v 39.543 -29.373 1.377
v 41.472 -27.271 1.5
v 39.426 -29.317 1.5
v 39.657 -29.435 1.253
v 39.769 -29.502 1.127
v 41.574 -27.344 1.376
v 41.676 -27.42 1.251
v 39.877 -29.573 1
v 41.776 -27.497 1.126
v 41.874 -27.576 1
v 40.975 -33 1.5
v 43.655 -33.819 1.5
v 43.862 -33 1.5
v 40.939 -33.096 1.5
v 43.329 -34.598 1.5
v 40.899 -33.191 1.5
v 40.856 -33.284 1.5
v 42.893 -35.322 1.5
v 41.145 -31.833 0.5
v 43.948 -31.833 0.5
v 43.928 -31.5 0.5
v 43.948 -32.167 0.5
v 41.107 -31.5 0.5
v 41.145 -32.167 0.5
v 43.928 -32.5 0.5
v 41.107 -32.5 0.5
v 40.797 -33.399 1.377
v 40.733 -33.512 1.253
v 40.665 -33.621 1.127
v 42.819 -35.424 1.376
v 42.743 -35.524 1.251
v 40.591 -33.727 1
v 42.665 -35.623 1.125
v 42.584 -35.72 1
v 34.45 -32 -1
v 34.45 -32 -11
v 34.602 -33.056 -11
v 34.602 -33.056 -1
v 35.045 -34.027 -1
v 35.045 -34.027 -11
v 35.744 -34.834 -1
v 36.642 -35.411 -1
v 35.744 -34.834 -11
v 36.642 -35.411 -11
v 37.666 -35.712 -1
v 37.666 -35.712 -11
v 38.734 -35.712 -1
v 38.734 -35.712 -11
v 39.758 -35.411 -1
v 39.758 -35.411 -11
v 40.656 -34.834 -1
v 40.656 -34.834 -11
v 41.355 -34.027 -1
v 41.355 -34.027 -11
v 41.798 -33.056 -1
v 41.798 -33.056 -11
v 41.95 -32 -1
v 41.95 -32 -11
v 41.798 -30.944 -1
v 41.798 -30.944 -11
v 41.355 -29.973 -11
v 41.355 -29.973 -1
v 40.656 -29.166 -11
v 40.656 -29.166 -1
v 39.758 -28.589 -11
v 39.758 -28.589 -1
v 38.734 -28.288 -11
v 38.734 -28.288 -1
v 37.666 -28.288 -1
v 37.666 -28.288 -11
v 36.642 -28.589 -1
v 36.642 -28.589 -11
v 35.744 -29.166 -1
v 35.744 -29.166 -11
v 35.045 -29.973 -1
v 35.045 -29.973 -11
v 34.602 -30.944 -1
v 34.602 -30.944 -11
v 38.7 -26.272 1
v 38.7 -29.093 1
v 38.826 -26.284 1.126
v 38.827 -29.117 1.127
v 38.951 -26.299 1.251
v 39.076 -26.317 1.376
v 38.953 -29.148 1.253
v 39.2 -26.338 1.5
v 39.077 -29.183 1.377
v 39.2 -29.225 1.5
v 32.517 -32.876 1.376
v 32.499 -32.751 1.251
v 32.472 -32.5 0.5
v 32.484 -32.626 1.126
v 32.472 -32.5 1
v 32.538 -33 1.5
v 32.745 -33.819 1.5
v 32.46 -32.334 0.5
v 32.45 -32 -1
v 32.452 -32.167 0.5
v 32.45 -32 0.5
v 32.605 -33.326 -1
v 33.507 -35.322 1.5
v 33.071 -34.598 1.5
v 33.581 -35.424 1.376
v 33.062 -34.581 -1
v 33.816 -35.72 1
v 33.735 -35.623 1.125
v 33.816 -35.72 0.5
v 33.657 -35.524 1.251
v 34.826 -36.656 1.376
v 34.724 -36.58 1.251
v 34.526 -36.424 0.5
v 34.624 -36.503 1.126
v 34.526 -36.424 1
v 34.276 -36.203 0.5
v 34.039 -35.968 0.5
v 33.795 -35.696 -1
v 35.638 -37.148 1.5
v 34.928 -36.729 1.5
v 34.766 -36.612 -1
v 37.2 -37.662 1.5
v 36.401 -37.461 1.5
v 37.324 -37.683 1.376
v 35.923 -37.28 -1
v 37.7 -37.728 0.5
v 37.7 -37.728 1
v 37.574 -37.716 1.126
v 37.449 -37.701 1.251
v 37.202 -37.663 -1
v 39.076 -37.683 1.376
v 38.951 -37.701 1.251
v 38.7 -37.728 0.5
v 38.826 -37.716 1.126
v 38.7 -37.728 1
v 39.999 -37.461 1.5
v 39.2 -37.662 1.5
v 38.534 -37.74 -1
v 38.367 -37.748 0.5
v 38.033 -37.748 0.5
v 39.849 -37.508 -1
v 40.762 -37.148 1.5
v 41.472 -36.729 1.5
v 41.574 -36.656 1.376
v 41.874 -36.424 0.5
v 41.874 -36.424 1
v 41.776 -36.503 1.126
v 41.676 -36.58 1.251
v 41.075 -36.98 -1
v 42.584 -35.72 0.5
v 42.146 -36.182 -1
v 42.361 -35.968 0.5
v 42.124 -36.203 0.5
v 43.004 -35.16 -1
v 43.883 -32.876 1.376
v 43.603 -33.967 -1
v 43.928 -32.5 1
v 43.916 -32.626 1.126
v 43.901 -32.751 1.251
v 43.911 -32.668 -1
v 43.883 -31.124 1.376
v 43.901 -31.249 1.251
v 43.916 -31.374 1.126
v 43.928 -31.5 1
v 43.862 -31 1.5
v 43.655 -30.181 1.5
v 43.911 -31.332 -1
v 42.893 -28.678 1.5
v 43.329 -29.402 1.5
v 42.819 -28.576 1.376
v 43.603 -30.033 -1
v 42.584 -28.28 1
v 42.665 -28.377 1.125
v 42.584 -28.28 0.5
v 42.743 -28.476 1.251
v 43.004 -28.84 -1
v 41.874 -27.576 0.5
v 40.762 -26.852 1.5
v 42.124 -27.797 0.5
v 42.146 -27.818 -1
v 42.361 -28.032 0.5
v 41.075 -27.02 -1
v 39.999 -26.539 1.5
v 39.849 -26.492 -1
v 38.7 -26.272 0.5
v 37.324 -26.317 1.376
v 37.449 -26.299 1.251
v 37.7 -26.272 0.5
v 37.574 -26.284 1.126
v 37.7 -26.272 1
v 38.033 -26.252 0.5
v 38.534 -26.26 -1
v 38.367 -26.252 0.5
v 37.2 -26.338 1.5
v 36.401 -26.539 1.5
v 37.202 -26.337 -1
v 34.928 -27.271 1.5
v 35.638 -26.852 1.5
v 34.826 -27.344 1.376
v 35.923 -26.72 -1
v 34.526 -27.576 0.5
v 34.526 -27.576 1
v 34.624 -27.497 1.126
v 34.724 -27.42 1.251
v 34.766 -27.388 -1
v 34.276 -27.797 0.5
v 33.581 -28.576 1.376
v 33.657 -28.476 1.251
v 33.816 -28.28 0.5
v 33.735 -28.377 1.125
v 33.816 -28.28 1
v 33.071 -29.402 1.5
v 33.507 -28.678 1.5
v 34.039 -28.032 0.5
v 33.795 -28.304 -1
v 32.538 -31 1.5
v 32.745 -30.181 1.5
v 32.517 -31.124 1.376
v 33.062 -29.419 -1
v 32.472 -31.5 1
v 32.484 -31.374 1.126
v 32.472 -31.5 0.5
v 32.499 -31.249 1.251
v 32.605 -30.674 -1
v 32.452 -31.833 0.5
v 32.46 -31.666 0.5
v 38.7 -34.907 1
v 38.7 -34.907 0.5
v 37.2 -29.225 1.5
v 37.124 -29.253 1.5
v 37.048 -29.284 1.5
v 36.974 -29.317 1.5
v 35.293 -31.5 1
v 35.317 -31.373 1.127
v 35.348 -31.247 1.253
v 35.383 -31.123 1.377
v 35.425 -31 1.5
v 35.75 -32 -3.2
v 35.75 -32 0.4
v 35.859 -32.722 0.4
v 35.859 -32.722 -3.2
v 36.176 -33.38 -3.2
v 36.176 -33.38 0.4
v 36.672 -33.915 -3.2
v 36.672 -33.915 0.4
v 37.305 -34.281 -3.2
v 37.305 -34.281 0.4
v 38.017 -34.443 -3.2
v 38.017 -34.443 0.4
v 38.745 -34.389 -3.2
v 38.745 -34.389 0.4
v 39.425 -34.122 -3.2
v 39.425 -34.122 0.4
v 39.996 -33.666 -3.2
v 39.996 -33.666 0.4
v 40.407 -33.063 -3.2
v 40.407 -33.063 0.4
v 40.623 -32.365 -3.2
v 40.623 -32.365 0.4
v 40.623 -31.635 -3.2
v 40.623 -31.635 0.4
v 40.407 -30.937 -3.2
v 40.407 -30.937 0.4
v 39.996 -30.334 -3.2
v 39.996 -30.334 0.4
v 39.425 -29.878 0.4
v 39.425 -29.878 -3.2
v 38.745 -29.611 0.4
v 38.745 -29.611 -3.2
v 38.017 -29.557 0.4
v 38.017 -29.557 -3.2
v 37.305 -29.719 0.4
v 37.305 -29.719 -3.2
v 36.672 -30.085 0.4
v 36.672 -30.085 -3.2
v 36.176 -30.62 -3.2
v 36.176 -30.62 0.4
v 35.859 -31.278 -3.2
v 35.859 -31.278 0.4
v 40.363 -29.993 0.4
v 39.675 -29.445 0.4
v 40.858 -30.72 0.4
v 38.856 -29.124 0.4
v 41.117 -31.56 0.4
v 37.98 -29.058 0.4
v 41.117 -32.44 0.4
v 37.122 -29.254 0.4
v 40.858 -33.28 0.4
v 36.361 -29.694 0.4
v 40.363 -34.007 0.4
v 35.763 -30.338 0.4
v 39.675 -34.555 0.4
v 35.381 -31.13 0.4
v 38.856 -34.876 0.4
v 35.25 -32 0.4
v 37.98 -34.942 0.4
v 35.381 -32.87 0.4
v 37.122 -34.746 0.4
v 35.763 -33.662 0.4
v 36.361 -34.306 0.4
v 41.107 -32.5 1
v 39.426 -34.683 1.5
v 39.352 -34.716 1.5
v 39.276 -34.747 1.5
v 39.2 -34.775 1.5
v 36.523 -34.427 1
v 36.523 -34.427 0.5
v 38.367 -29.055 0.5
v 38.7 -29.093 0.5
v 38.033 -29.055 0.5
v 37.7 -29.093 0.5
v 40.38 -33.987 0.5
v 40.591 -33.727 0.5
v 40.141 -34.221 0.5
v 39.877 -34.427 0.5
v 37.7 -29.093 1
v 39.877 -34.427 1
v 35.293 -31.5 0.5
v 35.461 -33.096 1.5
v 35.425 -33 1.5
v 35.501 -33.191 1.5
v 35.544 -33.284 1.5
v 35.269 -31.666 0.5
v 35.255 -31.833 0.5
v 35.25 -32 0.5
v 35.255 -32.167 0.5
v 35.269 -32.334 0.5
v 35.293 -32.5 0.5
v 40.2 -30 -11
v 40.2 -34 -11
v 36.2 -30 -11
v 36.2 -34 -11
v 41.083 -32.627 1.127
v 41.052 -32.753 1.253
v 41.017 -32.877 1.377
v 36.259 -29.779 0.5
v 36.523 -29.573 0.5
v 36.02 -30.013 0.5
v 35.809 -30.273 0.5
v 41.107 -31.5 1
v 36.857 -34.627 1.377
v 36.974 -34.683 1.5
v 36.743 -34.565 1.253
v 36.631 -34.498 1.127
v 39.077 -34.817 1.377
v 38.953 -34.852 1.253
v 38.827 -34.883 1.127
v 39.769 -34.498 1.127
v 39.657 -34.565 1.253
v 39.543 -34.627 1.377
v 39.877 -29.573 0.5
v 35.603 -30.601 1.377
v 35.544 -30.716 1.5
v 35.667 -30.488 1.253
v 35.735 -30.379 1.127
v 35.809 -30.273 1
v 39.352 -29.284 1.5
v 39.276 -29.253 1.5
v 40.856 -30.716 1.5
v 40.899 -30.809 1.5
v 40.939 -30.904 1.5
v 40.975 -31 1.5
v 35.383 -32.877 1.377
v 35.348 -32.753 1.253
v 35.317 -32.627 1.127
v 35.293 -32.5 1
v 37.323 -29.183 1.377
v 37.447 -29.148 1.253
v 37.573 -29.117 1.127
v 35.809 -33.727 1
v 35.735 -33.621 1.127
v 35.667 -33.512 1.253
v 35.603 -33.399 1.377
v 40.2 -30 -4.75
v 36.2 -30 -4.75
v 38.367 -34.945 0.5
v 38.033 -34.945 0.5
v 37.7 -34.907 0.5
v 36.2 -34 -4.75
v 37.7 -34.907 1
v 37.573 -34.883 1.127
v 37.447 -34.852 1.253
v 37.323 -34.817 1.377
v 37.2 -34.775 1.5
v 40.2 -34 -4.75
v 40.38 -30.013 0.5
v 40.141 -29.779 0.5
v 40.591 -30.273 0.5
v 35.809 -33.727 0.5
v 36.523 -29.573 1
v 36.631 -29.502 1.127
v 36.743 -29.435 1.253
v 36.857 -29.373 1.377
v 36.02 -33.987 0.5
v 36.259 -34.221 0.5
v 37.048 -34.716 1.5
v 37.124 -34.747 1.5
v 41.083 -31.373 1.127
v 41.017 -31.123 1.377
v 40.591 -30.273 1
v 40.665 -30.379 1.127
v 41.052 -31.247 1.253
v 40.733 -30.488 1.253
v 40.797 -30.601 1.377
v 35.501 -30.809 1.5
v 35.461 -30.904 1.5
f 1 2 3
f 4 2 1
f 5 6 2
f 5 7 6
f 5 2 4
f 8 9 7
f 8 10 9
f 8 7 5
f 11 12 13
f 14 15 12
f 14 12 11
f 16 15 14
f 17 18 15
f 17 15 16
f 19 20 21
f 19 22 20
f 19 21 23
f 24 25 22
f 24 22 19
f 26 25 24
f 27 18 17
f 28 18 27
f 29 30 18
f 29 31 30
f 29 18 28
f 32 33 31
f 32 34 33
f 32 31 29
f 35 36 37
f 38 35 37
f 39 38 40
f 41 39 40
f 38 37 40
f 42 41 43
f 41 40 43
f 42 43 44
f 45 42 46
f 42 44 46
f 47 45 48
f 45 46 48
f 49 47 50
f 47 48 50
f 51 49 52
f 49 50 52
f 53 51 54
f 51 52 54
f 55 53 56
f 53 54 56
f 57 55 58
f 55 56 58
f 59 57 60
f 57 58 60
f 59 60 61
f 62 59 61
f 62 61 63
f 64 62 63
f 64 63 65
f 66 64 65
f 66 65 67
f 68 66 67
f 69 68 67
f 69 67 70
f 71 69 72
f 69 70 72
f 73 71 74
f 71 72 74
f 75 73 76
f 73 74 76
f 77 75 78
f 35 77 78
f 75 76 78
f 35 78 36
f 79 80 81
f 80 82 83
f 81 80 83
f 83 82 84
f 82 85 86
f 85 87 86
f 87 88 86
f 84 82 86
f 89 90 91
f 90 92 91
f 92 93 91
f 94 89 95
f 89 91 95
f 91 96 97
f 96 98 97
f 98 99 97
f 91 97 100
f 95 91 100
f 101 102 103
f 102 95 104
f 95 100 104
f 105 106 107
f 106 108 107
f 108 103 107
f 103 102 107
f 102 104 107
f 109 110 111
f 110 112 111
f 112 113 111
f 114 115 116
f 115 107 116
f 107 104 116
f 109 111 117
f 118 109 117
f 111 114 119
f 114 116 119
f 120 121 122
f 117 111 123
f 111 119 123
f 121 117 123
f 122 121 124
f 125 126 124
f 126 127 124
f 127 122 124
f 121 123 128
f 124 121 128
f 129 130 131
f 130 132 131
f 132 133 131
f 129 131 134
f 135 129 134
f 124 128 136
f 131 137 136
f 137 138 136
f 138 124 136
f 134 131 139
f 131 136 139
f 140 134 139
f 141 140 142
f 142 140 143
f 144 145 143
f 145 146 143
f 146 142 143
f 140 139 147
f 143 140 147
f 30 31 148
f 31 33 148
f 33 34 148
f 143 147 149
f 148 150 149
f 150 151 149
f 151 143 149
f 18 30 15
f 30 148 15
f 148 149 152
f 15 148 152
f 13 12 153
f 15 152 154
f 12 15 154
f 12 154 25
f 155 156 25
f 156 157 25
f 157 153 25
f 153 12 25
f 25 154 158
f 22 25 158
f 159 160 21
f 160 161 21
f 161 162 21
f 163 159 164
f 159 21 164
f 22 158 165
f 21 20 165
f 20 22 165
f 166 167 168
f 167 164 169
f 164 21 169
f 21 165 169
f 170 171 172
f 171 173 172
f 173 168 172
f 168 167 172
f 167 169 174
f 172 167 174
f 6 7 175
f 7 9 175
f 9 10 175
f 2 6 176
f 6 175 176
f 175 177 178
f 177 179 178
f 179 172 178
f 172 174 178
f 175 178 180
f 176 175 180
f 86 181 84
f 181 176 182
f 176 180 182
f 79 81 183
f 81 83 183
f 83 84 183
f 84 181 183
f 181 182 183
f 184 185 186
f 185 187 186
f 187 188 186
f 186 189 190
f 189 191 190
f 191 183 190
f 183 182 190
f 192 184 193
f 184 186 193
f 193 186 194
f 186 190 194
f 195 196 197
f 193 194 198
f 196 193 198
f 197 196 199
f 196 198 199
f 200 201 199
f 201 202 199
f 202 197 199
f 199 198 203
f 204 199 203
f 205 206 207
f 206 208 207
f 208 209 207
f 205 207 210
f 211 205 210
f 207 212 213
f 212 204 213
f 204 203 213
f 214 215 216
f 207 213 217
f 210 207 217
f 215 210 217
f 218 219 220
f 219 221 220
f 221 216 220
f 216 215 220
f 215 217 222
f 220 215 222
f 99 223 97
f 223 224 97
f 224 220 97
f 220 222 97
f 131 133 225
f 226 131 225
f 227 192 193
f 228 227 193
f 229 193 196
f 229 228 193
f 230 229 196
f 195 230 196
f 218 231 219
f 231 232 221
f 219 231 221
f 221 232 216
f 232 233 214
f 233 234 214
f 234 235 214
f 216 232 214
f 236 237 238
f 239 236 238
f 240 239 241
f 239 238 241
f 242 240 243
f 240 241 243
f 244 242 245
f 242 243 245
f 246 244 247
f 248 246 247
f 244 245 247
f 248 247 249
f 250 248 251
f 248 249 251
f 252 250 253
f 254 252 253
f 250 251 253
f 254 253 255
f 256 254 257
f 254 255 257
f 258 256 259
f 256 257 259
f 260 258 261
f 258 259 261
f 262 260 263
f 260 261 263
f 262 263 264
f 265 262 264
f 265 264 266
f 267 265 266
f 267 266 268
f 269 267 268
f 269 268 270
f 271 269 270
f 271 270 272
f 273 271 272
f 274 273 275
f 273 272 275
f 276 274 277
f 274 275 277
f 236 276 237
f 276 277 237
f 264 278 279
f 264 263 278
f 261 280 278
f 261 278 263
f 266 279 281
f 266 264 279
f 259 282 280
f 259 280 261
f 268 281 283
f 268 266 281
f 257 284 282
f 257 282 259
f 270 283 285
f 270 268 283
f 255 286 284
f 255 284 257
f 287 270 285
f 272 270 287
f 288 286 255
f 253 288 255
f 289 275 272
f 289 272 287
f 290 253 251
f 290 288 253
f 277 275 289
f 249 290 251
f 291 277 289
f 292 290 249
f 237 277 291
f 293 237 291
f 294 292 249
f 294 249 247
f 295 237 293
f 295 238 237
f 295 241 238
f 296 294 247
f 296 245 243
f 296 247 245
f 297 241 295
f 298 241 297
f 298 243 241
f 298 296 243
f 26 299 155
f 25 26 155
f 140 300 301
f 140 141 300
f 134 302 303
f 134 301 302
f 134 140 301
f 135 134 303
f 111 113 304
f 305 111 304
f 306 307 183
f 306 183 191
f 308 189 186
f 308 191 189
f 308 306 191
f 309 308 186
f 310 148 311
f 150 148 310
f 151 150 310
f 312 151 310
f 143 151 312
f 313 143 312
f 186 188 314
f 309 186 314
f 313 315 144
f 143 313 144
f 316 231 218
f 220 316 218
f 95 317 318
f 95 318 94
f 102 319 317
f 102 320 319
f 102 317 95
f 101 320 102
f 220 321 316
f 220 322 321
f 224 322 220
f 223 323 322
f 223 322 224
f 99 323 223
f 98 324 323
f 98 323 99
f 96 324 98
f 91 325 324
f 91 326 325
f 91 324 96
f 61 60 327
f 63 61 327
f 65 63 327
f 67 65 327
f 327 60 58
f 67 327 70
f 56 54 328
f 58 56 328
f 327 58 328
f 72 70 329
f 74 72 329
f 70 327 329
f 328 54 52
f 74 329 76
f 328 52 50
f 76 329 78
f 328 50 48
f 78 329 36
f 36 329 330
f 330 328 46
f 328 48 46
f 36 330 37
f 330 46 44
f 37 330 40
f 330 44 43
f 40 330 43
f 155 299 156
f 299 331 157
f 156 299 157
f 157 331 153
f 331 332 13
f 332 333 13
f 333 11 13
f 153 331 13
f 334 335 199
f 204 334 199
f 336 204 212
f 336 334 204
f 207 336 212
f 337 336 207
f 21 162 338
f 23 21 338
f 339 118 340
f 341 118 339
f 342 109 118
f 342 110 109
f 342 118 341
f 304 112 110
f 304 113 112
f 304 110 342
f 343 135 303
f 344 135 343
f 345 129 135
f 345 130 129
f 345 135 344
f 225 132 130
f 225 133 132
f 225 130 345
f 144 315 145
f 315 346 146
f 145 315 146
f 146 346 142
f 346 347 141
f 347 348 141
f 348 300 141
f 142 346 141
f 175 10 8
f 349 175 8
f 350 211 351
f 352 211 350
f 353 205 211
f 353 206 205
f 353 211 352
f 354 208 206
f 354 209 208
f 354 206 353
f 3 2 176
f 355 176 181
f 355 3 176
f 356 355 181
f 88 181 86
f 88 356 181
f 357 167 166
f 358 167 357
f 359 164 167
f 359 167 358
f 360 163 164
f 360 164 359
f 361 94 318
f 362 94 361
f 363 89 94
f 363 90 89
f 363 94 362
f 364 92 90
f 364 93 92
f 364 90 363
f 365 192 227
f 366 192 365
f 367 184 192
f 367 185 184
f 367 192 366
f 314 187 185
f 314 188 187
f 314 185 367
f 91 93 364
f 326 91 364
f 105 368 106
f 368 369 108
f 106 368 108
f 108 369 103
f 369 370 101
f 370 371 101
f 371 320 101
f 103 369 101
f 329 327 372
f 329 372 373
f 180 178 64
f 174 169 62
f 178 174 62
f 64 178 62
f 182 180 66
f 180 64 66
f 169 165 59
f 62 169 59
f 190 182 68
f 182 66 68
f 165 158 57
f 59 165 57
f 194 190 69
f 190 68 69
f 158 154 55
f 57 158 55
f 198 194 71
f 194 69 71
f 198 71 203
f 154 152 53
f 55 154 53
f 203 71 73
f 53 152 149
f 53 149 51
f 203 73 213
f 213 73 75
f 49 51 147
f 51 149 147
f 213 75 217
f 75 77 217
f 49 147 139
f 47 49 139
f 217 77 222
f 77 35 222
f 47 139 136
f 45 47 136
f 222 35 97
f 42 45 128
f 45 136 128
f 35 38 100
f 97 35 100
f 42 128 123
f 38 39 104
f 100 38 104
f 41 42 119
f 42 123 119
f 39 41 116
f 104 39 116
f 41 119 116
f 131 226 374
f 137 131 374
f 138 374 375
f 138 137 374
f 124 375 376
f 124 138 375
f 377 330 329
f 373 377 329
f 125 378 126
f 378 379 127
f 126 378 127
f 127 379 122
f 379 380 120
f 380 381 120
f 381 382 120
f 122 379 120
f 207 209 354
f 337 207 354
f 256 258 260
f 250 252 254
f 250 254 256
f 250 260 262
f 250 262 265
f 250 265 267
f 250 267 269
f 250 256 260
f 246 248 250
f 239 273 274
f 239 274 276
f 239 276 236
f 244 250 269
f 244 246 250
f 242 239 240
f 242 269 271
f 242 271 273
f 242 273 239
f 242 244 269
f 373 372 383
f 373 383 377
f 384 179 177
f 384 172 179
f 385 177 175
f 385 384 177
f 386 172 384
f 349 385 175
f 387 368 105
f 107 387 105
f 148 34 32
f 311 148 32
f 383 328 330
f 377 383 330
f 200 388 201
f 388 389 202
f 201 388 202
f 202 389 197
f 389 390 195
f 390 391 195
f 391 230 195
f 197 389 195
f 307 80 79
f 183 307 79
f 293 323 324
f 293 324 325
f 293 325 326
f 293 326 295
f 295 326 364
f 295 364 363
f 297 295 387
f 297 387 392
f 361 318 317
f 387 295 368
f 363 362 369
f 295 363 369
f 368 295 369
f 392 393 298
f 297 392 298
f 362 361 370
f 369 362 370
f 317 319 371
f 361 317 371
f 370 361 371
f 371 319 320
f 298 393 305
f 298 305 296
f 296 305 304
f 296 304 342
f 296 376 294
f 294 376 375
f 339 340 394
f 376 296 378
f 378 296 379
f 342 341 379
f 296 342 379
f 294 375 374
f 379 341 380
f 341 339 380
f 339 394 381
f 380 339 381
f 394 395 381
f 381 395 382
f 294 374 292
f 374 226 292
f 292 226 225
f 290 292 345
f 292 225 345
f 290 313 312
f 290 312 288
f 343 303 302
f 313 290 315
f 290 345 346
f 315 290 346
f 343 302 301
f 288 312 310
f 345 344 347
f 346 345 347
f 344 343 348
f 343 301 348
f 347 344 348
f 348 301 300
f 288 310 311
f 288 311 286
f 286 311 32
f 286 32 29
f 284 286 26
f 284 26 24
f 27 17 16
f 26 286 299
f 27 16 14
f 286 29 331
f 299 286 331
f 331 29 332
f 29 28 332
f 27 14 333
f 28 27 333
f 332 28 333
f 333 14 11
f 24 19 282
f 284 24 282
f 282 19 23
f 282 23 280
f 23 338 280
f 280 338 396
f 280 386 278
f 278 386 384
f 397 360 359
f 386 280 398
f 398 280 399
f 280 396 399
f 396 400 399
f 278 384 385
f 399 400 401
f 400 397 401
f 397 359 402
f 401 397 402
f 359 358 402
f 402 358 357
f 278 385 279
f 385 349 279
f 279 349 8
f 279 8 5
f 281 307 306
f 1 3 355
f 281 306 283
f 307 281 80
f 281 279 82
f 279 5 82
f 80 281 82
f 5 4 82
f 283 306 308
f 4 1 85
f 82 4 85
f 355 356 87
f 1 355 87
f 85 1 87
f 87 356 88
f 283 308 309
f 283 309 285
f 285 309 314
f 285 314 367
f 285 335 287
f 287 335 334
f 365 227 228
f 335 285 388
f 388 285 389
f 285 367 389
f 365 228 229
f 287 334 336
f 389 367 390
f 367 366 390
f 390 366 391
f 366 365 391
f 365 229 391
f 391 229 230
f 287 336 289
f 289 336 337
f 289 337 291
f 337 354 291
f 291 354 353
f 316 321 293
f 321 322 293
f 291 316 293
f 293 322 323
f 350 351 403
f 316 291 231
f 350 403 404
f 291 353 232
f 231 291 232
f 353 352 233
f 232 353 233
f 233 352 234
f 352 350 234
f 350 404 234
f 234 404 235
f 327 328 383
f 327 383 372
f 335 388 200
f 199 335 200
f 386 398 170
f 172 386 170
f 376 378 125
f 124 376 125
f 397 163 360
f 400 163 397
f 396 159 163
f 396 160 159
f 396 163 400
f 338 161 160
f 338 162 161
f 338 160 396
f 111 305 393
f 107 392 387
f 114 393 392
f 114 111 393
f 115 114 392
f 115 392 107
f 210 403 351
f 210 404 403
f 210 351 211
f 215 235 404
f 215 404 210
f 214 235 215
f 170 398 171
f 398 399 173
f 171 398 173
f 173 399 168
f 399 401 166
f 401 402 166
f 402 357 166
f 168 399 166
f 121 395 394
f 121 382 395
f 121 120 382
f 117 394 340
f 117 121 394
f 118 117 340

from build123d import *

# Parameters (mm, degrees)
SKETCH275_R             = 3.75
PAD158_DEPTH            = 10
SKETCH276_R             = 5.75
PAD159_DEPTH            = 2.5
SKETCH277_R             = 2.95
POCKET130_DEPTH         = 1.1
SKETCH278_R             = 2.45
POCKET131_DEPTH         = 3.6
POCKET132_DEPTH         = 1
CHAMFER_SIZE            = 0.5
SKETCH280_W             = 4
SKETCH280_H             = 4
POCKET133_DEPTH         = 6.25
BODY023_PLACEMENT_ANGLE = 180


with BuildPart() as part:
    # Sketch275 → Pad158 (new body)
    with BuildSketch(Plane.XY):
        Circle(SKETCH275_R)
    extrude(amount=PAD158_DEPTH)

    # Sketch276 (on Face3 of Pad158) → Pad159 (join)
    with BuildSketch(Plane.XY.offset(10)):
        Circle(SKETCH276_R)
    extrude(amount=PAD159_DEPTH)

    # Sketch277 (on Face5 of Pad159) → Pocket130 (cut)
    with BuildSketch(Plane.XY.offset(12.5)):
        Circle(SKETCH277_R)
    extrude(amount=-POCKET130_DEPTH, mode=Mode.SUBTRACT)

    # Sketch278 (on Face7 of Pocket130) → Pocket131 (cut)
    with BuildSketch(Plane.XY.offset(11.4)):
        Circle(SKETCH278_R)
    extrude(amount=-POCKET131_DEPTH, mode=Mode.SUBTRACT)

    # Sketch279 (on Face5 of Pocket131) → Pocket132 (cut)
    with BuildSketch(Plane.XY.offset(12.5)):
        Polygon((-0.5, 6.25), (-0.5, 1.25), (-4.035534, 4.785534), (-4.742641, 4.078427), (-1.164214, 0.5), (-6.164214, 0.5), (-6.164214, -0.5), (-1.164214, -0.5), (-4.699747, -4.035534), (-3.992641, -4.742641), (-0.5, -1.25), (-0.5, -6.25), (0.5, -6.25), (0.5, -1.25), (3.992641, -4.742641), (4.699747, -4.035534), (1.164214, -0.5), (6.164214, -0.5), (6.164214, 0.5), (1.164214, 0.5), (4.742641, 4.078427), (4.035534, 4.785534), (0.5, 1.25), (0.5, 6.25), align=None)
    extrude(amount=-POCKET132_DEPTH, mode=Mode.SUBTRACT)

    # Chamfer
    chamfer_edges = [part.edges().sort_by_distance(p)[0] for p in [
        (0.5, 4.317769, 12.5),
        (-0.5, 4.317769, 12.5),
        (-2.675257, 3.425257, 12.5),
        (-3.387925, 2.723711, 12.5),
        (-4.317769, 0.5, 12.5),
        (-4.317769, -0.5, 12.5),
        (-3.387925, -2.723711, 12.5),
        (-2.675257, -3.425257, 12.5),
        (-0.5, -4.317769, 12.5),
        (0.5, -4.317769, 12.5),
        (2.675257, -3.425257, 12.5),
        (3.387925, -2.723711, 12.5),
        (4.317769, -0.5, 12.5),
        (4.317769, 0.5, 12.5),
        (3.387925, 2.723711, 12.5),
        (2.675257, 3.425257, 12.5),
    ]]
    chamfer(chamfer_edges, length=CHAMFER_SIZE)

    # Sketch280 (on Face54 of Chamfer) → Pocket133 (cut)
    with BuildSketch(Plane(origin=(0, 0, 0), x_dir=(1, 0, 0), z_dir=(0, 0, -1))):
        Rectangle(SKETCH280_W, SKETCH280_H)
    extrude(amount=-POCKET133_DEPTH, mode=Mode.SUBTRACT)


with BuildPart() as part_1:
    # Body023 placement: moved
    add(part.part.moved(Location((38.2, -32, -11))).rotate(Axis((38.2, -32, -11), (0, 0, 1)), BODY023_PLACEMENT_ANGLE))


solid = part_1.part
